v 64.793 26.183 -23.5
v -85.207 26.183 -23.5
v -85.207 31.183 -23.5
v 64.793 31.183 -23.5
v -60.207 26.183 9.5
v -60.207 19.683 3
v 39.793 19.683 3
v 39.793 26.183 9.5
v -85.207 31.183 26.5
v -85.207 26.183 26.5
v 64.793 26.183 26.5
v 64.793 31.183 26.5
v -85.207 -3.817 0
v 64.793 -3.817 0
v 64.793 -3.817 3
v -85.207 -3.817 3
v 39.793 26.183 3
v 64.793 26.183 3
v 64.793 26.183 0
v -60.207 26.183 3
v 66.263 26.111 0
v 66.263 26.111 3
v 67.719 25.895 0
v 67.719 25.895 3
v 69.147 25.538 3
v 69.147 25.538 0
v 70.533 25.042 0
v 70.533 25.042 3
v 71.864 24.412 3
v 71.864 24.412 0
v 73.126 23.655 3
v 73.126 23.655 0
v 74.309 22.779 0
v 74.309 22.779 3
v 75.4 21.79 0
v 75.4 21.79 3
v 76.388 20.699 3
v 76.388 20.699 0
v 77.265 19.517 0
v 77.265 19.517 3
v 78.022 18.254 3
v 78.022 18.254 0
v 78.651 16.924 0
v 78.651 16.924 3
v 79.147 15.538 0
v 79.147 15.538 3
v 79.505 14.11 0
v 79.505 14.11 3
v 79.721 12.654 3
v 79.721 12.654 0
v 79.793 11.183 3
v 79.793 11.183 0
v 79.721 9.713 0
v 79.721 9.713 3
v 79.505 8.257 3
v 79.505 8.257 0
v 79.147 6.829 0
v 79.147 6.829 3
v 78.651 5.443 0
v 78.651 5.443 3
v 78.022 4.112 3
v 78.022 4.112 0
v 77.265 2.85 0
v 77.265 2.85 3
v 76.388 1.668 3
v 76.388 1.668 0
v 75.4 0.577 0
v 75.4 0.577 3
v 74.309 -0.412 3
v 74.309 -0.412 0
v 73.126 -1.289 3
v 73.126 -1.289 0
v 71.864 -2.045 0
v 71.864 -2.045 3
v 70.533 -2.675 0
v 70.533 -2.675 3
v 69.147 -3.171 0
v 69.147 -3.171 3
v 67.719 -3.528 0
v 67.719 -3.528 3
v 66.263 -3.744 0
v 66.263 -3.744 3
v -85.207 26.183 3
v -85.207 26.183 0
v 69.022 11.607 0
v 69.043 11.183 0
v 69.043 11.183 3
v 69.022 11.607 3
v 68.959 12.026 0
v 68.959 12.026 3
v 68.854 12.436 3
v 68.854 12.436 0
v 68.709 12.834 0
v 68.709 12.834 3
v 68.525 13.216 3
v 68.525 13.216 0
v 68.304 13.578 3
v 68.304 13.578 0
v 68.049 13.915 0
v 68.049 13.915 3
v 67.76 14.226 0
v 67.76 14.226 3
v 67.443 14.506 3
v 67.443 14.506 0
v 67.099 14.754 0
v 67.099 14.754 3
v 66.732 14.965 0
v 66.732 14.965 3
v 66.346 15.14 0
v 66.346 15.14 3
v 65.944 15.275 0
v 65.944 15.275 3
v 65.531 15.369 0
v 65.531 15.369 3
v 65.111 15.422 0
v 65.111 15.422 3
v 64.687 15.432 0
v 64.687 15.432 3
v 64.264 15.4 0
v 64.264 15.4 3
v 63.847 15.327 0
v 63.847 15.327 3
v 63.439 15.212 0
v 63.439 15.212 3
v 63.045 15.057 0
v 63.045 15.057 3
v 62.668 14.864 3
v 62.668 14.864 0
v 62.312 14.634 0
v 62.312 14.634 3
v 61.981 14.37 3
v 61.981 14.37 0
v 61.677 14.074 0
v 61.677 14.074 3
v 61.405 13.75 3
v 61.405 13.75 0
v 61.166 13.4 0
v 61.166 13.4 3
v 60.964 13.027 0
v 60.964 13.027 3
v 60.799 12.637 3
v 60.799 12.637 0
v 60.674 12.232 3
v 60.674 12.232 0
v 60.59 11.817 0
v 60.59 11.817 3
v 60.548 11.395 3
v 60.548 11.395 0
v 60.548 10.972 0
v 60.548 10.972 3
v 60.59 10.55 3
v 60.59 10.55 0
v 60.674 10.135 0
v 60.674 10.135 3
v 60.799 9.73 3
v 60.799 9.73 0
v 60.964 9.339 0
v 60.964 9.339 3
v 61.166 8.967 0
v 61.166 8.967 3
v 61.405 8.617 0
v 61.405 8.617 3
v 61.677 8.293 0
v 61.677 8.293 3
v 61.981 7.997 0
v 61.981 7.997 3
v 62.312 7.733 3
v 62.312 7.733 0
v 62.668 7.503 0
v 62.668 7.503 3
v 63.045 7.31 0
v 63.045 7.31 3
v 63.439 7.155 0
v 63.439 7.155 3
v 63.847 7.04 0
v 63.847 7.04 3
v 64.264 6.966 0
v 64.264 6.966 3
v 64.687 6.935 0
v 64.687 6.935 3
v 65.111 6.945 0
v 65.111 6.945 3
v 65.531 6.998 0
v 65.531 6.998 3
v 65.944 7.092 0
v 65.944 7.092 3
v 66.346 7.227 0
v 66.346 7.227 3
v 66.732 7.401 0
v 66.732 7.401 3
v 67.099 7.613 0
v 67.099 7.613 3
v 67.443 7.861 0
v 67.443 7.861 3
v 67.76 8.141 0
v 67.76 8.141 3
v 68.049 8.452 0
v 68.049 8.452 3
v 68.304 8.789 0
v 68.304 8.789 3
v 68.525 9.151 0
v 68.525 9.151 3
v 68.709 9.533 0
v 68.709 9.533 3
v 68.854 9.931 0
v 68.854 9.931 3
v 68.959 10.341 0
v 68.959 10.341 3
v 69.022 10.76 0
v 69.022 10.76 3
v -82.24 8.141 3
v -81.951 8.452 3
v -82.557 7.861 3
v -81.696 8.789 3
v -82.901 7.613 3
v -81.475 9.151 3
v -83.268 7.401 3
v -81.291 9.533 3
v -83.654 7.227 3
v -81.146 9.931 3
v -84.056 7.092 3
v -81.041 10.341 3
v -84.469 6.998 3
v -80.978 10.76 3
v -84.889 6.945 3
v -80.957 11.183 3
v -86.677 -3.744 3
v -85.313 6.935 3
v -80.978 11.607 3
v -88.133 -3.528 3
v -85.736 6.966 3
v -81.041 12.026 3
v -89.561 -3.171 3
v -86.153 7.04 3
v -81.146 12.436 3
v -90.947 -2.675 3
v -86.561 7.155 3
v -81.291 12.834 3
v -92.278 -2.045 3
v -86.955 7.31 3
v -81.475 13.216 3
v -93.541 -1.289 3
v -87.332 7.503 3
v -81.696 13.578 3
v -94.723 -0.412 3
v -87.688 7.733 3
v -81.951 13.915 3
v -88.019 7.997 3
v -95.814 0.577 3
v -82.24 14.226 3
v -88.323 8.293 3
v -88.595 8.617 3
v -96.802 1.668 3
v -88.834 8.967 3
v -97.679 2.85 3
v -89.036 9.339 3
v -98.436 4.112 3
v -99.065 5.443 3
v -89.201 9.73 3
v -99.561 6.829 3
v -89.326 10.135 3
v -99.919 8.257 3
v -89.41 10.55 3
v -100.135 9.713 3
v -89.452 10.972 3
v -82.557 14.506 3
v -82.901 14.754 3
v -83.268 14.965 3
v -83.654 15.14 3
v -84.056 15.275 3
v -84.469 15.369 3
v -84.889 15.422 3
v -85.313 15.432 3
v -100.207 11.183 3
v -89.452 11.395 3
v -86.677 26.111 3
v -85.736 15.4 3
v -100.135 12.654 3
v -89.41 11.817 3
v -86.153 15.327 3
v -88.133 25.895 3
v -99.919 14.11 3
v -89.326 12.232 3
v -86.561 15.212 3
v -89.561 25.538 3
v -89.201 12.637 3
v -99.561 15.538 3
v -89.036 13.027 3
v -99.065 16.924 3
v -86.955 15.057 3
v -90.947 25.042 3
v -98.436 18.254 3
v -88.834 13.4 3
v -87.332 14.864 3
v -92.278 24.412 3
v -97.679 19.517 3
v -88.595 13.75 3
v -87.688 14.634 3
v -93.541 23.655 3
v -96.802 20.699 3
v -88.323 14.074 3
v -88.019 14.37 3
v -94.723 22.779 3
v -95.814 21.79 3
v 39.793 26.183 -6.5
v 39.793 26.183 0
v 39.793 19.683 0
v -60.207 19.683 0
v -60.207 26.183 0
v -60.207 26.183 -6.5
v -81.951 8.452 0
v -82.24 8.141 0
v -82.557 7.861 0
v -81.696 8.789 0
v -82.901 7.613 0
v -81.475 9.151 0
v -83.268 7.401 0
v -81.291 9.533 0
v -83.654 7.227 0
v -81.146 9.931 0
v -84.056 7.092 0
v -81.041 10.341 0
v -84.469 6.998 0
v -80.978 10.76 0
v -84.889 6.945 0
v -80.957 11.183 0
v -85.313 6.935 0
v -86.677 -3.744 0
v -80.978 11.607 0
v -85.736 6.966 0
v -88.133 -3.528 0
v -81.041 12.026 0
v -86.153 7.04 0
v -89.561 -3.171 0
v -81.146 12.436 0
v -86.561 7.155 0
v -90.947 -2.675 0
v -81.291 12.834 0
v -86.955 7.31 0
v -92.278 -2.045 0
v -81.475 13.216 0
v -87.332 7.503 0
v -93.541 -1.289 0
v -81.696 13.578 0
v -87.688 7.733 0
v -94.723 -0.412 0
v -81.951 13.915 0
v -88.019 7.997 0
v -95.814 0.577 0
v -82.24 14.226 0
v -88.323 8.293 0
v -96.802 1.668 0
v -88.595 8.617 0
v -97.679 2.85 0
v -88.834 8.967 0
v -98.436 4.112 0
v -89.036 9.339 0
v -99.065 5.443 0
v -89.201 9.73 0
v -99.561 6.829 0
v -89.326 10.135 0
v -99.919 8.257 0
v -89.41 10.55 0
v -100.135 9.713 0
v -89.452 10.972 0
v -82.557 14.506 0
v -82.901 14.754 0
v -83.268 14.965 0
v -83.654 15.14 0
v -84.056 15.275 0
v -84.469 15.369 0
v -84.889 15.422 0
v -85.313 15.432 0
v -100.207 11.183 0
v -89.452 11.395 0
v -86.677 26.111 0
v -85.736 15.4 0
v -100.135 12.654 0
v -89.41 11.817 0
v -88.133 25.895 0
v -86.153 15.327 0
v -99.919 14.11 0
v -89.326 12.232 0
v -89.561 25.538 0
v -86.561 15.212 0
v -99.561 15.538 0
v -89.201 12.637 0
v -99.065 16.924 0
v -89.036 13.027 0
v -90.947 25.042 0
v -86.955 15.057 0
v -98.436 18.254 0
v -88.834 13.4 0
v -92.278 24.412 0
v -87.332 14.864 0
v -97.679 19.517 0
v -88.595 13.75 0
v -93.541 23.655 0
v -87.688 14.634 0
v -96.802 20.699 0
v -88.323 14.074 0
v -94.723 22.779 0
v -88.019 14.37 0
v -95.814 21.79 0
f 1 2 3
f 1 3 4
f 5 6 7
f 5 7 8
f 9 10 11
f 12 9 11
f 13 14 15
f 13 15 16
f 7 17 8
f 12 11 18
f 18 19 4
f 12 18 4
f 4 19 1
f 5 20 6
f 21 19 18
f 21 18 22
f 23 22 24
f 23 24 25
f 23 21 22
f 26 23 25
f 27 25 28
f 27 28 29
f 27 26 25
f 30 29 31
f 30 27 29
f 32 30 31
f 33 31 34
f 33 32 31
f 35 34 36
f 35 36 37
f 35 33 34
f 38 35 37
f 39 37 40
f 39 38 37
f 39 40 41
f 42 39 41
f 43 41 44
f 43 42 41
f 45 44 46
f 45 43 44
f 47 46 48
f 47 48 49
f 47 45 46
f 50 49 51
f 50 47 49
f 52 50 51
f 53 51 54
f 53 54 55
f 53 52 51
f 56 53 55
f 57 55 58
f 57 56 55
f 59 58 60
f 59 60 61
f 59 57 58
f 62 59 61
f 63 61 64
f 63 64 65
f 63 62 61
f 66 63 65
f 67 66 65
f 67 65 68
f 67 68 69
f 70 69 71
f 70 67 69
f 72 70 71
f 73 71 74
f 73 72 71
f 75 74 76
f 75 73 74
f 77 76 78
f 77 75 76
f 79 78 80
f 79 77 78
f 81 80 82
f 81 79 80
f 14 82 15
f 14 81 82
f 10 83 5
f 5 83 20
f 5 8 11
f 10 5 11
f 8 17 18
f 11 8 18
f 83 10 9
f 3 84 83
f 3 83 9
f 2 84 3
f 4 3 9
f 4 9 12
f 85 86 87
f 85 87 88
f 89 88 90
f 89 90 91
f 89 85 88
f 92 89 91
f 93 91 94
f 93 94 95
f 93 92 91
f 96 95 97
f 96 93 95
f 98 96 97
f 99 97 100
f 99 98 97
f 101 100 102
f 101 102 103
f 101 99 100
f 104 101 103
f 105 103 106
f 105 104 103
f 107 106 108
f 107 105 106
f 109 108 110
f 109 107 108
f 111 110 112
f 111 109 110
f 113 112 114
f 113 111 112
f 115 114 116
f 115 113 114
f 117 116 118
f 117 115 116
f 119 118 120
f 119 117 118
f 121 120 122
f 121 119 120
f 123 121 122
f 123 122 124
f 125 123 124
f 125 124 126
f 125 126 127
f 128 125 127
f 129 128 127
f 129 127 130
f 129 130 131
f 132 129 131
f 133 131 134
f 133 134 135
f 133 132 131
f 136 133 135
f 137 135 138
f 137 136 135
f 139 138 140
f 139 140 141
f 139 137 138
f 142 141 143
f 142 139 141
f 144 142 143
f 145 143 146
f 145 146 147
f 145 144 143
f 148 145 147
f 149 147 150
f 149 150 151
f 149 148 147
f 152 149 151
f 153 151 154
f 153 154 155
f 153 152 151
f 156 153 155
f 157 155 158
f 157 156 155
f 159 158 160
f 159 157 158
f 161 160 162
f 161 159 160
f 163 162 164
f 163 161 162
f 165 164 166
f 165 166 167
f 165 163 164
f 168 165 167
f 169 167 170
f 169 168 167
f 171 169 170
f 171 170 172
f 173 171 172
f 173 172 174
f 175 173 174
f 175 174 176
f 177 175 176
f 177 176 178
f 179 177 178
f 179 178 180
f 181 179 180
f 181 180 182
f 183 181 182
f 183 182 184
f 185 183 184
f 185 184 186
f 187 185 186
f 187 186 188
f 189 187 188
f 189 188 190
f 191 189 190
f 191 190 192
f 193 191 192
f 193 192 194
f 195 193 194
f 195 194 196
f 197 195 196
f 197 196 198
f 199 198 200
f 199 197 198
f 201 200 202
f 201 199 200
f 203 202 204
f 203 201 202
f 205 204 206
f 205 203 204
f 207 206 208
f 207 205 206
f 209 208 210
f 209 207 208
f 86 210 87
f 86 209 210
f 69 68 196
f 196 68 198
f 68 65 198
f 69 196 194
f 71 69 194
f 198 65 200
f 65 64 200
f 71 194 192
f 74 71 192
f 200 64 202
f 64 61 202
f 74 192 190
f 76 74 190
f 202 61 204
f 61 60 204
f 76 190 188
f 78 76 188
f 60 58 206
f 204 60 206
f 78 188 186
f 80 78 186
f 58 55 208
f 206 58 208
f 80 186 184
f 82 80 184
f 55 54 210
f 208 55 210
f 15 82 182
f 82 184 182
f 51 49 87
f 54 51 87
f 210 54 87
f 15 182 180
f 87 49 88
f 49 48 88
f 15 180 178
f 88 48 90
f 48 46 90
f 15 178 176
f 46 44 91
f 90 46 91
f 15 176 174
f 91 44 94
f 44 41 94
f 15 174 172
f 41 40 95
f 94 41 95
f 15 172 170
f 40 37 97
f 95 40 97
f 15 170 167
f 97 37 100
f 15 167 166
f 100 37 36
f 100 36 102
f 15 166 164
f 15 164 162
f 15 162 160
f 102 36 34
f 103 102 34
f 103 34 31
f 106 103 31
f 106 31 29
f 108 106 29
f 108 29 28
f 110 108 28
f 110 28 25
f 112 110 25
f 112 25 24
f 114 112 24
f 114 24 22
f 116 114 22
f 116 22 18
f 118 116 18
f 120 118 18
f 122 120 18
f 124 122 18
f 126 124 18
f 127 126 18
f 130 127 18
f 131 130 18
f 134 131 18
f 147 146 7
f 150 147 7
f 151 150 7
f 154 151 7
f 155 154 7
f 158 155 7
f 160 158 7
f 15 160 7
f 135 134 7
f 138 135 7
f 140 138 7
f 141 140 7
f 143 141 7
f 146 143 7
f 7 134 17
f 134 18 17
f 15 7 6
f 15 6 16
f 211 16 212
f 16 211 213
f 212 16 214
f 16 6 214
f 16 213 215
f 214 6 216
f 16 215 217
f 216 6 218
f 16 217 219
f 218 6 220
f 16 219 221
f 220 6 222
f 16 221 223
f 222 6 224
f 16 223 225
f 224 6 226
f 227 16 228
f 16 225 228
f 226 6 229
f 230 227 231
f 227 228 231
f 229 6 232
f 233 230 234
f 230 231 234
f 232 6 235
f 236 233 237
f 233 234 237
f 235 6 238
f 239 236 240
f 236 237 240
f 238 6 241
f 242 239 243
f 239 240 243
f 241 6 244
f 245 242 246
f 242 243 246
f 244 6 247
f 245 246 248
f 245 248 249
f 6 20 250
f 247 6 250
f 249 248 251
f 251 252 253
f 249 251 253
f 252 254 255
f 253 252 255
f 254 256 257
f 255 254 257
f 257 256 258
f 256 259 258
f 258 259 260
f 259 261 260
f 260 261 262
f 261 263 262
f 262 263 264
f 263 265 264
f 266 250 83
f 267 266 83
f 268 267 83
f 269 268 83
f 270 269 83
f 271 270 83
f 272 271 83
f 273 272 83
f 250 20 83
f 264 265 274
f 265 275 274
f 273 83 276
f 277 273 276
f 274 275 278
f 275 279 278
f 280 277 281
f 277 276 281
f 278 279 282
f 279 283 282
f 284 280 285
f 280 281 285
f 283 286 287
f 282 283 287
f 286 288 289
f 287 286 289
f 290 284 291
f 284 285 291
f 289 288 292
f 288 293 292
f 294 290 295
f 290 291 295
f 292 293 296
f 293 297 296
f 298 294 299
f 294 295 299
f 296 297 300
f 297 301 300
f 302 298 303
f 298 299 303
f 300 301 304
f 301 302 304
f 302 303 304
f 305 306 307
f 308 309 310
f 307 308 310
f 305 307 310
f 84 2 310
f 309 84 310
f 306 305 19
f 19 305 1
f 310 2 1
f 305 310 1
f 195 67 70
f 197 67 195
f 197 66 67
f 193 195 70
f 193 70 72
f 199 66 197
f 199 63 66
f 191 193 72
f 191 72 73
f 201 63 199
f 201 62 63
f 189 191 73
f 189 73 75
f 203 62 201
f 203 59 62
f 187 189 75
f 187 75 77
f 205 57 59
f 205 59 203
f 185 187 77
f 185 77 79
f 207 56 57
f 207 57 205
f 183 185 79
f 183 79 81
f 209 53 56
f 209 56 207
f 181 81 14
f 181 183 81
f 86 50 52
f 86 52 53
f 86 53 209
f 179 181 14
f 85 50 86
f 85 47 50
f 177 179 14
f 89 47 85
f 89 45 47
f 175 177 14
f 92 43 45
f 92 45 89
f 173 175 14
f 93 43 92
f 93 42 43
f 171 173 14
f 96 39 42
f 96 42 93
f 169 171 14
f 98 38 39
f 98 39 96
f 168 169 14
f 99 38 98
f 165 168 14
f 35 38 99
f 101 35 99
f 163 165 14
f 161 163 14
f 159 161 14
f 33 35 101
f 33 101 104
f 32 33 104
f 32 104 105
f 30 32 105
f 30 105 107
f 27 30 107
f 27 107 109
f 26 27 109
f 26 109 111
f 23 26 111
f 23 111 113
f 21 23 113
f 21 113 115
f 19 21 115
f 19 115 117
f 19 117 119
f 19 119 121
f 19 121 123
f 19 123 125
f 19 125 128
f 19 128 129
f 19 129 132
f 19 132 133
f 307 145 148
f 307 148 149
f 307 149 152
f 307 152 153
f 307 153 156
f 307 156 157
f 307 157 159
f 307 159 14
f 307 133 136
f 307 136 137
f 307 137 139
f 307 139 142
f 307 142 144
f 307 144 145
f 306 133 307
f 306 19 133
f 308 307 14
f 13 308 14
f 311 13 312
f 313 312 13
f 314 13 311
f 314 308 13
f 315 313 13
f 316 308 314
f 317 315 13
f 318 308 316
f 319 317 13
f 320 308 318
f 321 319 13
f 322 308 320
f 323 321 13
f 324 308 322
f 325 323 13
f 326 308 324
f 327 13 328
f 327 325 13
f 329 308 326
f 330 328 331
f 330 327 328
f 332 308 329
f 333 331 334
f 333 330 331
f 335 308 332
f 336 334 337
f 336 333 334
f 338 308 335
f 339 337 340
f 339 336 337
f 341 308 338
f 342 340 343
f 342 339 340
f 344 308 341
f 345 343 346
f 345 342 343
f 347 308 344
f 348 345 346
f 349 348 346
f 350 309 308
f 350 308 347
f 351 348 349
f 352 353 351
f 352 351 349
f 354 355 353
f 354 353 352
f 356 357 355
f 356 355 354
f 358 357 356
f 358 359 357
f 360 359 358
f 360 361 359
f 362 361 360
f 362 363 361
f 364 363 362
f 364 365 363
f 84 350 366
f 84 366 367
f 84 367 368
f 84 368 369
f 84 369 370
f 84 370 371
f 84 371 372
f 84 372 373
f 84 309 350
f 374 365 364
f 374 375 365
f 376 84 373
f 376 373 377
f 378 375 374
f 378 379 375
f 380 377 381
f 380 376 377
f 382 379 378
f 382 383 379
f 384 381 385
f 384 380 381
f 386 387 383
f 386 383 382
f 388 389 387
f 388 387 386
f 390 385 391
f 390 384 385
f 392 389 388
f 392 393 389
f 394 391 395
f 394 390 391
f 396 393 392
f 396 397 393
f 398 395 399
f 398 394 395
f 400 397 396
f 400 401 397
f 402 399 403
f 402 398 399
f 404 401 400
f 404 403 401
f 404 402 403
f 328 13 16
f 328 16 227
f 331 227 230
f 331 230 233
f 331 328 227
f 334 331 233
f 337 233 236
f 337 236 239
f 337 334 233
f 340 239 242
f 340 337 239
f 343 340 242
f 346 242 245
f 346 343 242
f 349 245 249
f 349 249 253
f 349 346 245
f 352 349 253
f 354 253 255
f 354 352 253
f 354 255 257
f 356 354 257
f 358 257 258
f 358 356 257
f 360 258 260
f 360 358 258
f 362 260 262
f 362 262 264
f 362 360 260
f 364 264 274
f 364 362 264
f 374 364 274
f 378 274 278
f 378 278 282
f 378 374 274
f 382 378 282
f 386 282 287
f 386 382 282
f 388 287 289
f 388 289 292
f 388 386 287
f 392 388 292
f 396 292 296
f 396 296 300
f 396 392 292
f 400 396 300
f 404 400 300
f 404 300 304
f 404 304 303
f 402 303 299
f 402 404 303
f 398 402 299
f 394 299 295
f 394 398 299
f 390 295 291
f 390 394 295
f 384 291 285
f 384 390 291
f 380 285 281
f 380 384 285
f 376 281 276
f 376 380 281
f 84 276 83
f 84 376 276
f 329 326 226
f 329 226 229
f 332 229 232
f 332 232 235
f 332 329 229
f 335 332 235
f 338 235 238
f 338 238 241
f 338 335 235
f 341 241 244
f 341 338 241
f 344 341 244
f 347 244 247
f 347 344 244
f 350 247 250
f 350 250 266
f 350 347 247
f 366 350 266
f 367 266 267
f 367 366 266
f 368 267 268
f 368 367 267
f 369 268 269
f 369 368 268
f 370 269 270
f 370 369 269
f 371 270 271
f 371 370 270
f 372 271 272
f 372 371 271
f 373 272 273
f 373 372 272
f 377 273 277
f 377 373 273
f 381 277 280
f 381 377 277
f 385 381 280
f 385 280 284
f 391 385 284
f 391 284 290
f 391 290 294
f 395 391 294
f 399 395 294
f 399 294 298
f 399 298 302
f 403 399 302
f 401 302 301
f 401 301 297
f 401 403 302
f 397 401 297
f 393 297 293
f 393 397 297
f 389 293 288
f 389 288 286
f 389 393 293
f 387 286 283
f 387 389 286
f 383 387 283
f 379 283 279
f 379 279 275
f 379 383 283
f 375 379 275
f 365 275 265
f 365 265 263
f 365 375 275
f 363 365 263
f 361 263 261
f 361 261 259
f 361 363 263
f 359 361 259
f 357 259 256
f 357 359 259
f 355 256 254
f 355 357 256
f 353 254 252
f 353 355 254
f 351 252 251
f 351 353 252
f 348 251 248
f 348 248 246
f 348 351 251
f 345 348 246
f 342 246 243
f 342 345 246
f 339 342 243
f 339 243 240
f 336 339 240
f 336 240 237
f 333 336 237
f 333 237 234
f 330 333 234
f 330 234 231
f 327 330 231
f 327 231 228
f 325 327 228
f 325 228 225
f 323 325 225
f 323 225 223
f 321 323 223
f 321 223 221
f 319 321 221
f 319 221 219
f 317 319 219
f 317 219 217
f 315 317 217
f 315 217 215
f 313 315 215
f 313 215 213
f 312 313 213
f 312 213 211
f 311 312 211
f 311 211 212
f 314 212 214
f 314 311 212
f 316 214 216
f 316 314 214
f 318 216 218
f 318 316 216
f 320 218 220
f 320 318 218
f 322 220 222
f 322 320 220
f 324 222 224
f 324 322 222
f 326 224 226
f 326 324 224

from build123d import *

# Parameters (mm, degrees)
ESBO_O1_R                = 4.25
RESSALTO_EXTRUS_O1_DEPTH = 3
ESBO_O2_W                = 150
ESBO_O2_H                = 50
RESSALTO_EXTRUS_O2_DEPTH = 5
RESSALTO_EXTRUS_O3_START = -25
RESSALTO_EXTRUS_O3_DEPTH = 100


with BuildPart() as part:
    # Esboço1 → Ressalto-extrusão1 (new body)
    with BuildSketch(Plane.XY):
        with BuildLine():
            Line((-85.207100592, 26.183431953), (64.792899408, 26.183431953))
            ThreePointArc((64.792899408, 26.183431953), (79.792899408, 11.183431953), (64.792899408, -3.816568047))
            Line((64.792899408, -3.816568047), (-85.207100592, -3.816568047))
            ThreePointArc((-85.207100592, -3.816568047), (-100.207100592, 11.183431953), (-85.207100592, 26.183431953))
        make_face()
        with Locations((-85.207100592, 11.183431953)):
            Circle(ESBO_O1_R, mode=Mode.SUBTRACT)
        with Locations((64.792899408, 11.183431953)):
            Circle(ESBO_O1_R, mode=Mode.SUBTRACT)
    extrude(amount=RESSALTO_EXTRUS_O1_DEPTH)

    # Esboço2 → Ressalto-extrusão2 (add)
    with BuildSketch(Plane(origin=(0, 26.183431953, 0), x_dir=(1, 0, 0), z_dir=(0, 1, 0))):
        with Locations((-10.207100592, -1.5)):
            Rectangle(ESBO_O2_W, ESBO_O2_H)
    extrude(amount=RESSALTO_EXTRUS_O2_DEPTH)

    # Esboço3 → Ressalto-extrusão3 (add)
    with BuildSketch(Plane.ZY.offset(85.207100592).offset(RESSALTO_EXTRUS_O3_START)):
        Polygon((3, 19.683431953), (9.5, 26.183431953), (3, 26.183431953), align=None)
        Polygon((0, 26.183431953), (0, 19.683431953), (-6.5, 26.183431953), align=None)
    extrude(amount=-RESSALTO_EXTRUS_O3_DEPTH)


solid = part.part
